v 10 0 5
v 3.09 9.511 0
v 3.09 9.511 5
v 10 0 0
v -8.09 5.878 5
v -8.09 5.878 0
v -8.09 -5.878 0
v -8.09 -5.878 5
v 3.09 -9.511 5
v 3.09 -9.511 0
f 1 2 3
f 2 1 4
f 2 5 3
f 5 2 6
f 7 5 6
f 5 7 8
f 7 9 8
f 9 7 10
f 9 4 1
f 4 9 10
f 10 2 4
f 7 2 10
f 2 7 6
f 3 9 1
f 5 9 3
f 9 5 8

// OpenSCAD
// file: ../math/vect.scad
function vect_scalar_sum(v, incr) = [for (i = [0: len(v) - 1]) v[i] + incr];

function vSize(size) = (!is_list(size)) ? [size, size, size]: size; 


function vect_2d_to_3d(vect, z = 0) = [vect[0], vect[1], z];

function vect_rotate2d(vect, b) = [
    cos(b) * vect[0] - sin(b) * vect[1],
    sin(b) * vect[0] + cos(b) * vect[1]
];

function round_vect(v) = [for (i = [0: len(v) - 1]) round(v[i])];
// file: ../math/align.scad
use <vect.scad>
module align_center(sizes, center = true, centerZ = false){
    sizes = vSize(sizes);
    if (center){
        translate([-sizes[0] / 2, -sizes[1] / 2, (centerZ ? -sizes[2]/2 : 0)]){
            children();
        }
    } else {
        children();
    }   
}

module align_uncenter(sizes, uncenter = true, uncenterZ = false){
    sizes = vSize(sizes);
    if (uncenter){
        translate([sizes[0] / 2, sizes[1] / 2, (uncenterZ ? sizes[2]/2 : 0)]){
            children();
        }
    } else {
        children();
    }   
}

module zz(z){
    translate([0, 0, z])
        children();
}

module xx(x){
    translate([x, 0, 0])
        children();
}

module yy(y){
    translate([0, y, 0])
        children();
}


// align_center(20){
//     align_uncenter(20){
//         cube(20);
//     }
// }
// main file
use <../math/align.scad>
use <../math/vect.scad>

module multiangle(angles, r, h){
    cylinder(h = h, r1=r, r2=r, $fn=angles);
}

multiangle(5, 10, 5);
